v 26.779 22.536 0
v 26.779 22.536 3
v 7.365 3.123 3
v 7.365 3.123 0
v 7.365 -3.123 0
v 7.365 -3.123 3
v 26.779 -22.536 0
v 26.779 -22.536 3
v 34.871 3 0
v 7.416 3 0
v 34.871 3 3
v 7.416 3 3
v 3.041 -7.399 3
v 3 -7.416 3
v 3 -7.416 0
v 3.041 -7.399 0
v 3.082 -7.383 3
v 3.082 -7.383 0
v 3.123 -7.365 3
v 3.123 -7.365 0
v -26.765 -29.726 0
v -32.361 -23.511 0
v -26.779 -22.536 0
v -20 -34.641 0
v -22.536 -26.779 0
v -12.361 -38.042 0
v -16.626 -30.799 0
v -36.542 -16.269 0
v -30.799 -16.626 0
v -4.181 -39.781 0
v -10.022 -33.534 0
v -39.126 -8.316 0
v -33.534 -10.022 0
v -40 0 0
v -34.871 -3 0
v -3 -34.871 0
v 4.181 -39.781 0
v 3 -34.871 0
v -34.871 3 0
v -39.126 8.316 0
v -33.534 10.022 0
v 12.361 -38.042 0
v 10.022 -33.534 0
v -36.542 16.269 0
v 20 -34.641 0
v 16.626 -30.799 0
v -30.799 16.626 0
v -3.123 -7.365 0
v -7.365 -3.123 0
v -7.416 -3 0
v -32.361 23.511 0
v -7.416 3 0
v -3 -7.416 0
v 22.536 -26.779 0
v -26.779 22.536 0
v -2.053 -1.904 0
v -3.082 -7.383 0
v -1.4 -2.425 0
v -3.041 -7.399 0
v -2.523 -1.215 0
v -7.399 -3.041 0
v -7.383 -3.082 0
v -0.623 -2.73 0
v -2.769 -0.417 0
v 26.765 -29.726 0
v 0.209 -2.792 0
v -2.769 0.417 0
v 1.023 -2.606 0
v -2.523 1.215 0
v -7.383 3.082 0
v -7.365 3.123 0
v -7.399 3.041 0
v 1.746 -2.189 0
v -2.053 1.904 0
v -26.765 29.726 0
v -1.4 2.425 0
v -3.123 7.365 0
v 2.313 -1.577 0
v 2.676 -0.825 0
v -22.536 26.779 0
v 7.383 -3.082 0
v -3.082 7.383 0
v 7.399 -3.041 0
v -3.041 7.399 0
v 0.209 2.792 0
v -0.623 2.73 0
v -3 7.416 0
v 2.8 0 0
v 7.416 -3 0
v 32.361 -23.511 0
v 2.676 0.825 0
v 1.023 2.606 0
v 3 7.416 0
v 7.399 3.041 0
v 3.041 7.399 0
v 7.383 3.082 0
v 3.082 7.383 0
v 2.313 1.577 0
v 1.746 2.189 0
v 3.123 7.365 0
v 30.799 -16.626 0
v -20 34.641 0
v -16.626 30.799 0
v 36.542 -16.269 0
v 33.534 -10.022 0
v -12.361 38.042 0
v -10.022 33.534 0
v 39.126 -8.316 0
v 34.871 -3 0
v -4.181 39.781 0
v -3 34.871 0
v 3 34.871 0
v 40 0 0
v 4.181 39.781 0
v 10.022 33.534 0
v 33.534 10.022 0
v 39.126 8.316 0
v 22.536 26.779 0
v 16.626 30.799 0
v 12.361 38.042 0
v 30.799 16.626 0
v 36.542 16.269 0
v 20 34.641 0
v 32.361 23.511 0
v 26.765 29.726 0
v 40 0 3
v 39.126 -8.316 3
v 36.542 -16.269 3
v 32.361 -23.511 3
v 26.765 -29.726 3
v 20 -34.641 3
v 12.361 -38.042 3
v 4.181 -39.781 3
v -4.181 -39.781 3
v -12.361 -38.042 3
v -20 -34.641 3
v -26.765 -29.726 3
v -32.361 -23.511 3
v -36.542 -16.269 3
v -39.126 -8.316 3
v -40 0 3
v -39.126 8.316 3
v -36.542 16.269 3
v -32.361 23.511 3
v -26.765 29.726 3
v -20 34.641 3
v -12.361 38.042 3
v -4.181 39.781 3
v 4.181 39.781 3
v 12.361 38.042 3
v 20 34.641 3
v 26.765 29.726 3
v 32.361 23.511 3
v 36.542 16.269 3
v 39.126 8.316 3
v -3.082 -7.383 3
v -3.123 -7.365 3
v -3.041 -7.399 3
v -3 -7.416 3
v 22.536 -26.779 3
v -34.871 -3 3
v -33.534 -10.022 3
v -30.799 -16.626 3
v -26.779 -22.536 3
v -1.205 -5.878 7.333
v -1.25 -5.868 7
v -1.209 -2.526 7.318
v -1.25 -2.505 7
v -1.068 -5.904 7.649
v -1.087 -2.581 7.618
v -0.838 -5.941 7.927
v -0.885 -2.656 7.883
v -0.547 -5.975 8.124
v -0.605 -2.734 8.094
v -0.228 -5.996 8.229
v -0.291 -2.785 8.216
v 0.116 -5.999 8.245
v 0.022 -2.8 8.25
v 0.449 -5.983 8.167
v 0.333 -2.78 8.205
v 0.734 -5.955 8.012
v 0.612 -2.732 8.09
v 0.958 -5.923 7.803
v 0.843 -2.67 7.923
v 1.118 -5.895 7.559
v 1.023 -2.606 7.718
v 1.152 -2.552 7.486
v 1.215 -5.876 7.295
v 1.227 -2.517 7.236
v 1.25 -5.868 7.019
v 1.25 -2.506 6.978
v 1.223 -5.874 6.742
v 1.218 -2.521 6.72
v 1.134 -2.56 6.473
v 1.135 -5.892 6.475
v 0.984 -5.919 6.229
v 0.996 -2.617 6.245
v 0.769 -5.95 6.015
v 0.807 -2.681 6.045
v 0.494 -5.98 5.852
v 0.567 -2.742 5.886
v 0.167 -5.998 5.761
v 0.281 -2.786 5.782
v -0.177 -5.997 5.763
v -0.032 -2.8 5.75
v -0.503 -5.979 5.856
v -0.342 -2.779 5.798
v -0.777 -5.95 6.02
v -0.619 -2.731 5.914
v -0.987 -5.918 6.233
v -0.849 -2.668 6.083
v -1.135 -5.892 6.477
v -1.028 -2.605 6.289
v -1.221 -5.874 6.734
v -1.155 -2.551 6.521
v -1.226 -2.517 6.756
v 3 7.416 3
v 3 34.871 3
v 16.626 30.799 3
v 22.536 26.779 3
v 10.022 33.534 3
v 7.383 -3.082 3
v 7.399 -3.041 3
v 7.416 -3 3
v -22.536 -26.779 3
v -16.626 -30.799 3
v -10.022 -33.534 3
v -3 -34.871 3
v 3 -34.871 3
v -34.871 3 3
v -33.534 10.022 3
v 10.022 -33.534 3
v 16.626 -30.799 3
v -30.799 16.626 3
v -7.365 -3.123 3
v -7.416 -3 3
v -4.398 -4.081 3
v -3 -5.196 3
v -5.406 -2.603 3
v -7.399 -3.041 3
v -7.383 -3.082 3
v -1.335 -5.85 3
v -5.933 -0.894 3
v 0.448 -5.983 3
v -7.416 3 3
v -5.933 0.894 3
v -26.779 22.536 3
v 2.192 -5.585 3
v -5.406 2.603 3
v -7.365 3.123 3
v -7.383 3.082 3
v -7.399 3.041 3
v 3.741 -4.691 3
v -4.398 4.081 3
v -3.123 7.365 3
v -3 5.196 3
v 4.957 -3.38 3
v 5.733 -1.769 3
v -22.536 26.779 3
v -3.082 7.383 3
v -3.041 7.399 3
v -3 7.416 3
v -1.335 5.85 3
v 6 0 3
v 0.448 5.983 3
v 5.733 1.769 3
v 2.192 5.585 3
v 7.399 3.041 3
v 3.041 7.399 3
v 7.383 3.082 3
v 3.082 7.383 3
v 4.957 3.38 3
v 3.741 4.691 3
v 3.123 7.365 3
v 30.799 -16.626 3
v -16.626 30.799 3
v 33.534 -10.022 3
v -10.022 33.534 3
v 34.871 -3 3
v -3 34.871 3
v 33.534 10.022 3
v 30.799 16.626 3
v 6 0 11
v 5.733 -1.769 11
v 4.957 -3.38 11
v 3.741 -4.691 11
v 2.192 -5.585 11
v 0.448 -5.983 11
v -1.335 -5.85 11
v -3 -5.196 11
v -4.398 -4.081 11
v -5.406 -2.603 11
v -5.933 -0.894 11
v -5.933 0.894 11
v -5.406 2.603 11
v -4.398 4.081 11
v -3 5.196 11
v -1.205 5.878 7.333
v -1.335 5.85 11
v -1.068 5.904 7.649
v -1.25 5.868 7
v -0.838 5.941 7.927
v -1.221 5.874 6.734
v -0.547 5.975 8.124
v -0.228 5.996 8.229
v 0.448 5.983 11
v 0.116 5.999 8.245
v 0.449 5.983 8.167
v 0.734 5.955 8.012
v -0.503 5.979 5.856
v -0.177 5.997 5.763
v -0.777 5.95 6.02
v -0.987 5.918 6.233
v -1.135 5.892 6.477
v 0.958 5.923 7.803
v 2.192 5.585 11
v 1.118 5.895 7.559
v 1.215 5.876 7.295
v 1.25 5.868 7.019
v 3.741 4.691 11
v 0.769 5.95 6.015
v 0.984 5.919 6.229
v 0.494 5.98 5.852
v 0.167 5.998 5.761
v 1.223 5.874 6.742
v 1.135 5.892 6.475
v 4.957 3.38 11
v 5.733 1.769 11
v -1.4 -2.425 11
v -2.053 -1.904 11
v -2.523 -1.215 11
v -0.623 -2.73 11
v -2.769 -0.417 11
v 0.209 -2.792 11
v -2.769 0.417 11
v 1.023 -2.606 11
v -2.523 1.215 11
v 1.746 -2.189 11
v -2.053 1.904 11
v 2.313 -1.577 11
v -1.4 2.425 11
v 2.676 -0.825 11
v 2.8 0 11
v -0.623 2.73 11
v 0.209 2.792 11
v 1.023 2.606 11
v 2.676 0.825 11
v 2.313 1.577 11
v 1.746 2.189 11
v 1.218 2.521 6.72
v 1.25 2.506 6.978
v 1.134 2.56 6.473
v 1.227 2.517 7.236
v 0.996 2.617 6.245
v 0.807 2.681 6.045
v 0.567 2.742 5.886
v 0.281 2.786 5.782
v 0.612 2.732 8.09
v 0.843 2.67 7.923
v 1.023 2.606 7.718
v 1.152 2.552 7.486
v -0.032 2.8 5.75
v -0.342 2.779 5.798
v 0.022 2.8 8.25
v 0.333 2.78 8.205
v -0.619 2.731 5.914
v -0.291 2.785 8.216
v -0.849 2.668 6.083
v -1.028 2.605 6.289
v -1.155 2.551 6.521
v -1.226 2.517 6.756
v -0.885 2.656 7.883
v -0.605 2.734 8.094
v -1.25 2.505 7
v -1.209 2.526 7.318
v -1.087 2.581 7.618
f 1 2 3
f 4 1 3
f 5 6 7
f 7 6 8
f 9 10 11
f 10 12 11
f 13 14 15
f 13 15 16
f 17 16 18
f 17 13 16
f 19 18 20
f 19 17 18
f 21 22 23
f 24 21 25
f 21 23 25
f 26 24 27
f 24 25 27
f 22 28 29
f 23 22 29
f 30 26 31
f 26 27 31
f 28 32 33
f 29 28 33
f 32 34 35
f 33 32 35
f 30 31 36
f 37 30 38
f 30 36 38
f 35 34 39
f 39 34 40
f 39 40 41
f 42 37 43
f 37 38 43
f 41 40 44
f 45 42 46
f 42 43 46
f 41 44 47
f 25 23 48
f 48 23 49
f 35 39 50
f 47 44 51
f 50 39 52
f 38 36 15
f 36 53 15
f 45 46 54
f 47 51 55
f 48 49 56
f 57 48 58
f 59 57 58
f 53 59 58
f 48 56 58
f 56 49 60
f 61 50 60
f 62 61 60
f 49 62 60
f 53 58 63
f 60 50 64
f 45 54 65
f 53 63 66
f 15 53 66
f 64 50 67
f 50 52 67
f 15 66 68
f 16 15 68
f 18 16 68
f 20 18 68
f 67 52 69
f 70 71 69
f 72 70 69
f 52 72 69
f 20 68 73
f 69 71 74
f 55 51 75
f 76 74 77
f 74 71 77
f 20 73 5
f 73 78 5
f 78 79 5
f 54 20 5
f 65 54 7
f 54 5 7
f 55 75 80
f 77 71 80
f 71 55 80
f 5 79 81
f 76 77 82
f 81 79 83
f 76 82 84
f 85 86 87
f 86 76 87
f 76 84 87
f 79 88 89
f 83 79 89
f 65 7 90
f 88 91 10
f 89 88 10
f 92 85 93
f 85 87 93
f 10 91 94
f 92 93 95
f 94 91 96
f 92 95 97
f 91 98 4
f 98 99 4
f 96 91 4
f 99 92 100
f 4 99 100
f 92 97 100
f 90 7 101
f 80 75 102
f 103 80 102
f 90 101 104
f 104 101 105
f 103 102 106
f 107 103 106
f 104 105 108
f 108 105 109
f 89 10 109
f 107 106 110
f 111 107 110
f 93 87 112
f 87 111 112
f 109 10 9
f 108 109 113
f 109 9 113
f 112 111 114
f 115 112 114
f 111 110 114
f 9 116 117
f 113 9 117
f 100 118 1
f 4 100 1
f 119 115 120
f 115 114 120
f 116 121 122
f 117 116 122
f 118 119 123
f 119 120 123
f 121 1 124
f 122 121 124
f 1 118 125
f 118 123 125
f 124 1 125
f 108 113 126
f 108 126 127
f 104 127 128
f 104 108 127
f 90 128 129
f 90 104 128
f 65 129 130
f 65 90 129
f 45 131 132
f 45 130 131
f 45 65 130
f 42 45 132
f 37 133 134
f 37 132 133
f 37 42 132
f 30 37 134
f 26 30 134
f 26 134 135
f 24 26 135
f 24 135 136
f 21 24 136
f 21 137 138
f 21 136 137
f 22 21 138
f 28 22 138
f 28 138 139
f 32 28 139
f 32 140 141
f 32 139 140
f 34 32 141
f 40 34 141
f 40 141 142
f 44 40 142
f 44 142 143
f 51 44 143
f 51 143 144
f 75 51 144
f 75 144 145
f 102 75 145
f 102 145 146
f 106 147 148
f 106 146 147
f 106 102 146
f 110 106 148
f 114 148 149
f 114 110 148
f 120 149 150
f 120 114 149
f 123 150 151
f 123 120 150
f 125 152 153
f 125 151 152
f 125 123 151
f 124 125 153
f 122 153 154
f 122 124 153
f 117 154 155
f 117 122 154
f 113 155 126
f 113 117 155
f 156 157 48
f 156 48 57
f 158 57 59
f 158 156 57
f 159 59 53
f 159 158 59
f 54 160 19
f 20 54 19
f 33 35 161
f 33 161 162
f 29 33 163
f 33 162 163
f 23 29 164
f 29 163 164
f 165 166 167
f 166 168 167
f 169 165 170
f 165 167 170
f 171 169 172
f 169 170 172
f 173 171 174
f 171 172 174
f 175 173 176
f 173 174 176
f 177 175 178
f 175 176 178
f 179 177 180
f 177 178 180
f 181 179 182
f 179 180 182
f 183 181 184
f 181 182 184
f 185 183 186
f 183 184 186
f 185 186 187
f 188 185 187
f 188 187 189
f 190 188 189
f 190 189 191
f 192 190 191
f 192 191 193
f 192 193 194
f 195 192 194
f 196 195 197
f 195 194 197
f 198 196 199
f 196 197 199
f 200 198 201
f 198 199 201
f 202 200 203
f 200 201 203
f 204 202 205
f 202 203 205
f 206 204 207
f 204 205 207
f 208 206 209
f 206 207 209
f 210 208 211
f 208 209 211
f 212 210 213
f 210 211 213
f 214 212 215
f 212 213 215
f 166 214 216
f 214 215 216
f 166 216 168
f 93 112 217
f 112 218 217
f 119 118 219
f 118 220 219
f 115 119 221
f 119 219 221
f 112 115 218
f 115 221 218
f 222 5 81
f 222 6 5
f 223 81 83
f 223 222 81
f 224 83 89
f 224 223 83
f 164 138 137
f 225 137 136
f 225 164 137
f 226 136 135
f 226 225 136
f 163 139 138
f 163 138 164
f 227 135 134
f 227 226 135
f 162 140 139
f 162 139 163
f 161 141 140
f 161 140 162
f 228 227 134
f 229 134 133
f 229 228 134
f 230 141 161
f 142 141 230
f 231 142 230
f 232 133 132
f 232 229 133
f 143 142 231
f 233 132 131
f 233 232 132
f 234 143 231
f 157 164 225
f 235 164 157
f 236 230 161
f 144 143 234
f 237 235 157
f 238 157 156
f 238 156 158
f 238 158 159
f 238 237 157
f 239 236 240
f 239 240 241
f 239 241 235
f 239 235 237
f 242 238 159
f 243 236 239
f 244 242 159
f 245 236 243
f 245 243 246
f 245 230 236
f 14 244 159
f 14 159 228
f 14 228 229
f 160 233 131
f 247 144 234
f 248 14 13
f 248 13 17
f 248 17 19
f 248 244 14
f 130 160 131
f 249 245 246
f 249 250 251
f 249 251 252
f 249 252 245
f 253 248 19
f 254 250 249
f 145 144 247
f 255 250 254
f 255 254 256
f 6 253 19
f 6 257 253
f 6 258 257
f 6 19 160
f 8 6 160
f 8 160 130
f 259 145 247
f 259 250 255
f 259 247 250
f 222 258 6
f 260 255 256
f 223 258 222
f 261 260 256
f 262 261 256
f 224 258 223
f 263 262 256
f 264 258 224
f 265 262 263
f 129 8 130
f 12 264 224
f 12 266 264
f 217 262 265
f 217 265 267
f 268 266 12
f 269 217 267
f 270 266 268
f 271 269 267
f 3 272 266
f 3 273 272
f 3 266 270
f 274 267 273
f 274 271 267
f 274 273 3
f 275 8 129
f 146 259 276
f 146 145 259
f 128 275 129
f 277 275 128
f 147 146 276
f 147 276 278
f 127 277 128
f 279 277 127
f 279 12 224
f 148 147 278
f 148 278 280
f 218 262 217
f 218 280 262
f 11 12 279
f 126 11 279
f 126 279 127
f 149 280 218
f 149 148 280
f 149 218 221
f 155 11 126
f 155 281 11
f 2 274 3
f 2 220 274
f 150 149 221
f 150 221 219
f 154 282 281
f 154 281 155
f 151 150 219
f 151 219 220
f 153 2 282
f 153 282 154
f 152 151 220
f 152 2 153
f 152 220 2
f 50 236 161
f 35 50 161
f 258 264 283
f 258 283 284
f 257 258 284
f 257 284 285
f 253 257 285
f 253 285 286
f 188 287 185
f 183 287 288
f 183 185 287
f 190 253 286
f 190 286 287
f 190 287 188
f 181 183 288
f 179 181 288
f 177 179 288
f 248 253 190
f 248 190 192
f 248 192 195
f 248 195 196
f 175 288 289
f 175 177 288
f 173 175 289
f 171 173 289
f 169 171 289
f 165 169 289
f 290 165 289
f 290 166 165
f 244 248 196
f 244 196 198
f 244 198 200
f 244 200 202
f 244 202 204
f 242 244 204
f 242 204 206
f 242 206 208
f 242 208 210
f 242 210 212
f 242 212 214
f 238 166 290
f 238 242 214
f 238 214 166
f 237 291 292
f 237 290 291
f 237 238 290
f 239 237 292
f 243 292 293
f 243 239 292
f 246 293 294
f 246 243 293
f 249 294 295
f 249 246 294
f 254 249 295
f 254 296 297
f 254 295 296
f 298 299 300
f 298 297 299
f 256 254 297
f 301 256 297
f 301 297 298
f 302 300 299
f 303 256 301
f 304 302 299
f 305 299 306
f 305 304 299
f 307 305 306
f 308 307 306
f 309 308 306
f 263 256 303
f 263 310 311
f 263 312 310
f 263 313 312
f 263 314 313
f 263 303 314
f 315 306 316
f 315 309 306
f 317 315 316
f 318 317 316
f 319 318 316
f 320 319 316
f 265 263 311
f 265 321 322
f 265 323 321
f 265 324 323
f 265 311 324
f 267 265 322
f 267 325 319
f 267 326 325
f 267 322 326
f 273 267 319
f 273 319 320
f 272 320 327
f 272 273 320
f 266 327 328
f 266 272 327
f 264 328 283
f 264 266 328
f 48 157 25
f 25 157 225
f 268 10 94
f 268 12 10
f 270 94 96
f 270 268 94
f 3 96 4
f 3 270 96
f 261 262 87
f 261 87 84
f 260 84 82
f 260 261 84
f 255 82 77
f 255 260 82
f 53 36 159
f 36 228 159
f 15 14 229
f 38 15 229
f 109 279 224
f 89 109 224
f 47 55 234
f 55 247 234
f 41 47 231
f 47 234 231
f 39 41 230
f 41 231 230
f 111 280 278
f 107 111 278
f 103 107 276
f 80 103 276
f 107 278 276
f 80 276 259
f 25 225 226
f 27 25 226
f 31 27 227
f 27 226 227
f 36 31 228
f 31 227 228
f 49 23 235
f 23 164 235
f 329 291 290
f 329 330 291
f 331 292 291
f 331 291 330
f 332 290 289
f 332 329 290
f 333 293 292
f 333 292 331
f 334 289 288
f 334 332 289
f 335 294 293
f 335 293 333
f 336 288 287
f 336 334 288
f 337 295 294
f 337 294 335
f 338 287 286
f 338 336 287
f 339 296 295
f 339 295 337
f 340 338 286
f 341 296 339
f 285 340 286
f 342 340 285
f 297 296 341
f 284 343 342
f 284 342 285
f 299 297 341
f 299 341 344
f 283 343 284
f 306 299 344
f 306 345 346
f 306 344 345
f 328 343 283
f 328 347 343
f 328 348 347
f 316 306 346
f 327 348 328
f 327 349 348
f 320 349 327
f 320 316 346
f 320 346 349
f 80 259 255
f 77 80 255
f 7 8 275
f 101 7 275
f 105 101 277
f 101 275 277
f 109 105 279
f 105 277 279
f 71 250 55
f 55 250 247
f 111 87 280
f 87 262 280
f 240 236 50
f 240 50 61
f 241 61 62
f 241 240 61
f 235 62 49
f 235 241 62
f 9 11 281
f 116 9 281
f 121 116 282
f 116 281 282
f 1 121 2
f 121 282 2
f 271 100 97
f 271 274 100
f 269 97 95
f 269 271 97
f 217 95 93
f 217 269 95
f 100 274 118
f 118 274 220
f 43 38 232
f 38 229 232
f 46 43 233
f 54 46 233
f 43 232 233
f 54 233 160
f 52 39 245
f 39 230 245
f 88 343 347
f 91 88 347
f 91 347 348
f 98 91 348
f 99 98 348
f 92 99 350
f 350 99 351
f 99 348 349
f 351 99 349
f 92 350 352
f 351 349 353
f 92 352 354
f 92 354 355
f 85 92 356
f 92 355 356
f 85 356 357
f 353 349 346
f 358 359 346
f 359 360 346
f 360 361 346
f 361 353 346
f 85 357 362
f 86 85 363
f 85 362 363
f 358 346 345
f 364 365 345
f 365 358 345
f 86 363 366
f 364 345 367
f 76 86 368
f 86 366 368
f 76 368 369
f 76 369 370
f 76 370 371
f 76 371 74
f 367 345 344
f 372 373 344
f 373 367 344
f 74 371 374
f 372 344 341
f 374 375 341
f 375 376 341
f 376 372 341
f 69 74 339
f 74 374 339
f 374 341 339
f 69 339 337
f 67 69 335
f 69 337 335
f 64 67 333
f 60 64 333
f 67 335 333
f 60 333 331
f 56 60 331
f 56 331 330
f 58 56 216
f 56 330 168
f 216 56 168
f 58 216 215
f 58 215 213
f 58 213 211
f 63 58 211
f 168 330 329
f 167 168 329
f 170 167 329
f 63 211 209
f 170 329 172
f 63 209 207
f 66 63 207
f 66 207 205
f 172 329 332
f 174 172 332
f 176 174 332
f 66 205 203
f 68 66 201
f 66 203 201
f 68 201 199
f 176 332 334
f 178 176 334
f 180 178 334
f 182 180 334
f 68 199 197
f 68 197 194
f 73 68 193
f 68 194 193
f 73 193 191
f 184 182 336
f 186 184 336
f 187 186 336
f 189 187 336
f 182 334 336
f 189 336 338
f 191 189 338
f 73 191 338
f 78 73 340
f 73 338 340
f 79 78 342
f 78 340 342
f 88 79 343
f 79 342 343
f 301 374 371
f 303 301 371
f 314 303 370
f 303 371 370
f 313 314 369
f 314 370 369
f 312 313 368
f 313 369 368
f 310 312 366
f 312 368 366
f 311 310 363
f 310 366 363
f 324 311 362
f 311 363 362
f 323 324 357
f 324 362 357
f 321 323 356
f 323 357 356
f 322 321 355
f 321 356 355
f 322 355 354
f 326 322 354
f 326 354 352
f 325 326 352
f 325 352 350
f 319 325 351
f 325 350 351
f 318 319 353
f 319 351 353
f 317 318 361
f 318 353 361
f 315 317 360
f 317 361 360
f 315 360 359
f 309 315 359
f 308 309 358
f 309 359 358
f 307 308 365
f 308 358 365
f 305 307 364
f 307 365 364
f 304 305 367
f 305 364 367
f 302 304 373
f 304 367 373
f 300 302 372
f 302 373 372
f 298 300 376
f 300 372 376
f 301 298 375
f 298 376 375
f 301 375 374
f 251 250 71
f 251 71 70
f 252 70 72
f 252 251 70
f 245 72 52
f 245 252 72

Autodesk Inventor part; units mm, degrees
ref_plane "YZ Plane" through (0, 0, 0) normal (1, 0, 0) x (0, 1, 0)
ref_plane "XY Plane" through (0, 0, 0) normal (0, 0, 1) x (1, 0, 0)
sketch "スケッチ1" plane through (0, 0, 0) normal (0, 0, 1) x (1, 0, 0)
  circle A0 centre (0, 0) radius 40
  circle A1 centre (0, 0) radius 2.5
  dimension "d0" = 80
  dimension "d1" = 5
extrude "押し出し1" add sketch "スケッチ1" along normal blind 3
sketch "スケッチ2" plane through (0, 0, 3) normal (0, 0, 1) x (1, 0, 0)
  circle A0 centre (0, 0) radius 8
  circle A1 centre (0, 0) radius 2.5 projected
  circle A2 centre (0, 0) radius 35
  line L0 (3, 34.8712) -> (3, 7.4162)
  line L1 (-3, 7.4162) -> (-3, 34.8712)
  line L2 (-7.3654, 3.1227) -> (-26.779, 22.5363)
  line L3 (-22.5363, 26.779) -> (-3.1227, 7.3654)
  circle A3 centre (0, 0) radius 35
  circle A4 centre (0, 0) radius 8
  line L4 (-7.4162, -3) -> (-34.8712, -3)
  line L5 (-34.8712, 3) -> (-7.4162, 3)
  circle A5 centre (0, 0) radius 35
  circle A6 centre (0, 0) radius 8
  line L6 (-3.1227, -7.3654) -> (-22.5363, -26.779)
  line L7 (-26.779, -22.5363) -> (-7.3654, -3.1227)
  circle A7 centre (0, 0) radius 35
  circle A8 centre (0, 0) radius 8
  line L8 (3, -7.4162) -> (3, -34.8712)
  line L9 (-3, -34.8712) -> (-3, -7.4162)
  circle A9 centre (0, 0) radius 35
  circle A10 centre (0, 0) radius 8
  line L10 (7.3654, -3.1227) -> (26.779, -22.5363)
  line L11 (22.5363, -26.779) -> (3.1227, -7.3654)
  circle A11 centre (0, 0) radius 35
  circle A12 centre (0, 0) radius 8
  line L12 (7.4162, 3) -> (34.8712, 3)
  line L13 (34.8712, -3) -> (7.4162, -3)
  circle A13 centre (0, 0) radius 35
  circle A14 centre (0, 0) radius 8
  line L14 (3.1227, 7.3654) -> (22.5363, 26.779)
  line L15 (26.779, 22.5363) -> (7.3654, 3.1227)
  circle A15 centre (0, 0) radius 35
  circle A16 centre (0, 0) radius 8
  dimension "d4" = 16
  dimension "d5" = 70
  dimension "d6" = 3
  dimension "d7" = 6
  dimension "d10" = 360
extrude "押し出し2" cut sketch "スケッチ2" against normal blind 5 contours A0 L15 A2 L12 | L13 A2 L10 A0 | A0 L0 A2 L14 | L11 A2 L8 A0 | A0 L3 A2 L1 | L9 A2 L6 A0 | A0 L5 A2 L2 | L7 A2 L4 A0
sketch "スケッチ3" plane through (0, 0, 3) normal (0, 0, 1) x (1, 0, 0)
  circle A0 centre (0, 0) radius 2.5 projected
  circle A1 centre (0, 0) radius 2.5
  circle A2 centre (0, 0) radius 6
  dimension "d14" = 12
extrude "押し出し3" add sketch "スケッチ3" along normal blind 8
ref_plane "作業平面1" through (0, 0, 0) normal (0, 1, 0) x (-1, 0, 0)
sketch "スケッチ4" plane through (0, 0, 0) normal (0, 1, 0) x (-1, 0, 0)
  circle A0 centre (0, 7) radius 1.25
  line L0 (40, 3) -> (-40, 3) projected
  point P0 (0, 0)
  dimension "d18" = 2.5
  dimension "d19" = 4
extrude "押し出し4" cut sketch "スケッチ4" along normal mid plane 15
sketch "スケッチ5" plane through (0, 0, 11) normal (0, 0, 1) x (1, 0, 0)
  circle A0 centre (0, 0) radius 2.8
  dimension "d22" = 5.6
extrude "押し出し5" cut sketch "スケッチ5" against normal blind 20
